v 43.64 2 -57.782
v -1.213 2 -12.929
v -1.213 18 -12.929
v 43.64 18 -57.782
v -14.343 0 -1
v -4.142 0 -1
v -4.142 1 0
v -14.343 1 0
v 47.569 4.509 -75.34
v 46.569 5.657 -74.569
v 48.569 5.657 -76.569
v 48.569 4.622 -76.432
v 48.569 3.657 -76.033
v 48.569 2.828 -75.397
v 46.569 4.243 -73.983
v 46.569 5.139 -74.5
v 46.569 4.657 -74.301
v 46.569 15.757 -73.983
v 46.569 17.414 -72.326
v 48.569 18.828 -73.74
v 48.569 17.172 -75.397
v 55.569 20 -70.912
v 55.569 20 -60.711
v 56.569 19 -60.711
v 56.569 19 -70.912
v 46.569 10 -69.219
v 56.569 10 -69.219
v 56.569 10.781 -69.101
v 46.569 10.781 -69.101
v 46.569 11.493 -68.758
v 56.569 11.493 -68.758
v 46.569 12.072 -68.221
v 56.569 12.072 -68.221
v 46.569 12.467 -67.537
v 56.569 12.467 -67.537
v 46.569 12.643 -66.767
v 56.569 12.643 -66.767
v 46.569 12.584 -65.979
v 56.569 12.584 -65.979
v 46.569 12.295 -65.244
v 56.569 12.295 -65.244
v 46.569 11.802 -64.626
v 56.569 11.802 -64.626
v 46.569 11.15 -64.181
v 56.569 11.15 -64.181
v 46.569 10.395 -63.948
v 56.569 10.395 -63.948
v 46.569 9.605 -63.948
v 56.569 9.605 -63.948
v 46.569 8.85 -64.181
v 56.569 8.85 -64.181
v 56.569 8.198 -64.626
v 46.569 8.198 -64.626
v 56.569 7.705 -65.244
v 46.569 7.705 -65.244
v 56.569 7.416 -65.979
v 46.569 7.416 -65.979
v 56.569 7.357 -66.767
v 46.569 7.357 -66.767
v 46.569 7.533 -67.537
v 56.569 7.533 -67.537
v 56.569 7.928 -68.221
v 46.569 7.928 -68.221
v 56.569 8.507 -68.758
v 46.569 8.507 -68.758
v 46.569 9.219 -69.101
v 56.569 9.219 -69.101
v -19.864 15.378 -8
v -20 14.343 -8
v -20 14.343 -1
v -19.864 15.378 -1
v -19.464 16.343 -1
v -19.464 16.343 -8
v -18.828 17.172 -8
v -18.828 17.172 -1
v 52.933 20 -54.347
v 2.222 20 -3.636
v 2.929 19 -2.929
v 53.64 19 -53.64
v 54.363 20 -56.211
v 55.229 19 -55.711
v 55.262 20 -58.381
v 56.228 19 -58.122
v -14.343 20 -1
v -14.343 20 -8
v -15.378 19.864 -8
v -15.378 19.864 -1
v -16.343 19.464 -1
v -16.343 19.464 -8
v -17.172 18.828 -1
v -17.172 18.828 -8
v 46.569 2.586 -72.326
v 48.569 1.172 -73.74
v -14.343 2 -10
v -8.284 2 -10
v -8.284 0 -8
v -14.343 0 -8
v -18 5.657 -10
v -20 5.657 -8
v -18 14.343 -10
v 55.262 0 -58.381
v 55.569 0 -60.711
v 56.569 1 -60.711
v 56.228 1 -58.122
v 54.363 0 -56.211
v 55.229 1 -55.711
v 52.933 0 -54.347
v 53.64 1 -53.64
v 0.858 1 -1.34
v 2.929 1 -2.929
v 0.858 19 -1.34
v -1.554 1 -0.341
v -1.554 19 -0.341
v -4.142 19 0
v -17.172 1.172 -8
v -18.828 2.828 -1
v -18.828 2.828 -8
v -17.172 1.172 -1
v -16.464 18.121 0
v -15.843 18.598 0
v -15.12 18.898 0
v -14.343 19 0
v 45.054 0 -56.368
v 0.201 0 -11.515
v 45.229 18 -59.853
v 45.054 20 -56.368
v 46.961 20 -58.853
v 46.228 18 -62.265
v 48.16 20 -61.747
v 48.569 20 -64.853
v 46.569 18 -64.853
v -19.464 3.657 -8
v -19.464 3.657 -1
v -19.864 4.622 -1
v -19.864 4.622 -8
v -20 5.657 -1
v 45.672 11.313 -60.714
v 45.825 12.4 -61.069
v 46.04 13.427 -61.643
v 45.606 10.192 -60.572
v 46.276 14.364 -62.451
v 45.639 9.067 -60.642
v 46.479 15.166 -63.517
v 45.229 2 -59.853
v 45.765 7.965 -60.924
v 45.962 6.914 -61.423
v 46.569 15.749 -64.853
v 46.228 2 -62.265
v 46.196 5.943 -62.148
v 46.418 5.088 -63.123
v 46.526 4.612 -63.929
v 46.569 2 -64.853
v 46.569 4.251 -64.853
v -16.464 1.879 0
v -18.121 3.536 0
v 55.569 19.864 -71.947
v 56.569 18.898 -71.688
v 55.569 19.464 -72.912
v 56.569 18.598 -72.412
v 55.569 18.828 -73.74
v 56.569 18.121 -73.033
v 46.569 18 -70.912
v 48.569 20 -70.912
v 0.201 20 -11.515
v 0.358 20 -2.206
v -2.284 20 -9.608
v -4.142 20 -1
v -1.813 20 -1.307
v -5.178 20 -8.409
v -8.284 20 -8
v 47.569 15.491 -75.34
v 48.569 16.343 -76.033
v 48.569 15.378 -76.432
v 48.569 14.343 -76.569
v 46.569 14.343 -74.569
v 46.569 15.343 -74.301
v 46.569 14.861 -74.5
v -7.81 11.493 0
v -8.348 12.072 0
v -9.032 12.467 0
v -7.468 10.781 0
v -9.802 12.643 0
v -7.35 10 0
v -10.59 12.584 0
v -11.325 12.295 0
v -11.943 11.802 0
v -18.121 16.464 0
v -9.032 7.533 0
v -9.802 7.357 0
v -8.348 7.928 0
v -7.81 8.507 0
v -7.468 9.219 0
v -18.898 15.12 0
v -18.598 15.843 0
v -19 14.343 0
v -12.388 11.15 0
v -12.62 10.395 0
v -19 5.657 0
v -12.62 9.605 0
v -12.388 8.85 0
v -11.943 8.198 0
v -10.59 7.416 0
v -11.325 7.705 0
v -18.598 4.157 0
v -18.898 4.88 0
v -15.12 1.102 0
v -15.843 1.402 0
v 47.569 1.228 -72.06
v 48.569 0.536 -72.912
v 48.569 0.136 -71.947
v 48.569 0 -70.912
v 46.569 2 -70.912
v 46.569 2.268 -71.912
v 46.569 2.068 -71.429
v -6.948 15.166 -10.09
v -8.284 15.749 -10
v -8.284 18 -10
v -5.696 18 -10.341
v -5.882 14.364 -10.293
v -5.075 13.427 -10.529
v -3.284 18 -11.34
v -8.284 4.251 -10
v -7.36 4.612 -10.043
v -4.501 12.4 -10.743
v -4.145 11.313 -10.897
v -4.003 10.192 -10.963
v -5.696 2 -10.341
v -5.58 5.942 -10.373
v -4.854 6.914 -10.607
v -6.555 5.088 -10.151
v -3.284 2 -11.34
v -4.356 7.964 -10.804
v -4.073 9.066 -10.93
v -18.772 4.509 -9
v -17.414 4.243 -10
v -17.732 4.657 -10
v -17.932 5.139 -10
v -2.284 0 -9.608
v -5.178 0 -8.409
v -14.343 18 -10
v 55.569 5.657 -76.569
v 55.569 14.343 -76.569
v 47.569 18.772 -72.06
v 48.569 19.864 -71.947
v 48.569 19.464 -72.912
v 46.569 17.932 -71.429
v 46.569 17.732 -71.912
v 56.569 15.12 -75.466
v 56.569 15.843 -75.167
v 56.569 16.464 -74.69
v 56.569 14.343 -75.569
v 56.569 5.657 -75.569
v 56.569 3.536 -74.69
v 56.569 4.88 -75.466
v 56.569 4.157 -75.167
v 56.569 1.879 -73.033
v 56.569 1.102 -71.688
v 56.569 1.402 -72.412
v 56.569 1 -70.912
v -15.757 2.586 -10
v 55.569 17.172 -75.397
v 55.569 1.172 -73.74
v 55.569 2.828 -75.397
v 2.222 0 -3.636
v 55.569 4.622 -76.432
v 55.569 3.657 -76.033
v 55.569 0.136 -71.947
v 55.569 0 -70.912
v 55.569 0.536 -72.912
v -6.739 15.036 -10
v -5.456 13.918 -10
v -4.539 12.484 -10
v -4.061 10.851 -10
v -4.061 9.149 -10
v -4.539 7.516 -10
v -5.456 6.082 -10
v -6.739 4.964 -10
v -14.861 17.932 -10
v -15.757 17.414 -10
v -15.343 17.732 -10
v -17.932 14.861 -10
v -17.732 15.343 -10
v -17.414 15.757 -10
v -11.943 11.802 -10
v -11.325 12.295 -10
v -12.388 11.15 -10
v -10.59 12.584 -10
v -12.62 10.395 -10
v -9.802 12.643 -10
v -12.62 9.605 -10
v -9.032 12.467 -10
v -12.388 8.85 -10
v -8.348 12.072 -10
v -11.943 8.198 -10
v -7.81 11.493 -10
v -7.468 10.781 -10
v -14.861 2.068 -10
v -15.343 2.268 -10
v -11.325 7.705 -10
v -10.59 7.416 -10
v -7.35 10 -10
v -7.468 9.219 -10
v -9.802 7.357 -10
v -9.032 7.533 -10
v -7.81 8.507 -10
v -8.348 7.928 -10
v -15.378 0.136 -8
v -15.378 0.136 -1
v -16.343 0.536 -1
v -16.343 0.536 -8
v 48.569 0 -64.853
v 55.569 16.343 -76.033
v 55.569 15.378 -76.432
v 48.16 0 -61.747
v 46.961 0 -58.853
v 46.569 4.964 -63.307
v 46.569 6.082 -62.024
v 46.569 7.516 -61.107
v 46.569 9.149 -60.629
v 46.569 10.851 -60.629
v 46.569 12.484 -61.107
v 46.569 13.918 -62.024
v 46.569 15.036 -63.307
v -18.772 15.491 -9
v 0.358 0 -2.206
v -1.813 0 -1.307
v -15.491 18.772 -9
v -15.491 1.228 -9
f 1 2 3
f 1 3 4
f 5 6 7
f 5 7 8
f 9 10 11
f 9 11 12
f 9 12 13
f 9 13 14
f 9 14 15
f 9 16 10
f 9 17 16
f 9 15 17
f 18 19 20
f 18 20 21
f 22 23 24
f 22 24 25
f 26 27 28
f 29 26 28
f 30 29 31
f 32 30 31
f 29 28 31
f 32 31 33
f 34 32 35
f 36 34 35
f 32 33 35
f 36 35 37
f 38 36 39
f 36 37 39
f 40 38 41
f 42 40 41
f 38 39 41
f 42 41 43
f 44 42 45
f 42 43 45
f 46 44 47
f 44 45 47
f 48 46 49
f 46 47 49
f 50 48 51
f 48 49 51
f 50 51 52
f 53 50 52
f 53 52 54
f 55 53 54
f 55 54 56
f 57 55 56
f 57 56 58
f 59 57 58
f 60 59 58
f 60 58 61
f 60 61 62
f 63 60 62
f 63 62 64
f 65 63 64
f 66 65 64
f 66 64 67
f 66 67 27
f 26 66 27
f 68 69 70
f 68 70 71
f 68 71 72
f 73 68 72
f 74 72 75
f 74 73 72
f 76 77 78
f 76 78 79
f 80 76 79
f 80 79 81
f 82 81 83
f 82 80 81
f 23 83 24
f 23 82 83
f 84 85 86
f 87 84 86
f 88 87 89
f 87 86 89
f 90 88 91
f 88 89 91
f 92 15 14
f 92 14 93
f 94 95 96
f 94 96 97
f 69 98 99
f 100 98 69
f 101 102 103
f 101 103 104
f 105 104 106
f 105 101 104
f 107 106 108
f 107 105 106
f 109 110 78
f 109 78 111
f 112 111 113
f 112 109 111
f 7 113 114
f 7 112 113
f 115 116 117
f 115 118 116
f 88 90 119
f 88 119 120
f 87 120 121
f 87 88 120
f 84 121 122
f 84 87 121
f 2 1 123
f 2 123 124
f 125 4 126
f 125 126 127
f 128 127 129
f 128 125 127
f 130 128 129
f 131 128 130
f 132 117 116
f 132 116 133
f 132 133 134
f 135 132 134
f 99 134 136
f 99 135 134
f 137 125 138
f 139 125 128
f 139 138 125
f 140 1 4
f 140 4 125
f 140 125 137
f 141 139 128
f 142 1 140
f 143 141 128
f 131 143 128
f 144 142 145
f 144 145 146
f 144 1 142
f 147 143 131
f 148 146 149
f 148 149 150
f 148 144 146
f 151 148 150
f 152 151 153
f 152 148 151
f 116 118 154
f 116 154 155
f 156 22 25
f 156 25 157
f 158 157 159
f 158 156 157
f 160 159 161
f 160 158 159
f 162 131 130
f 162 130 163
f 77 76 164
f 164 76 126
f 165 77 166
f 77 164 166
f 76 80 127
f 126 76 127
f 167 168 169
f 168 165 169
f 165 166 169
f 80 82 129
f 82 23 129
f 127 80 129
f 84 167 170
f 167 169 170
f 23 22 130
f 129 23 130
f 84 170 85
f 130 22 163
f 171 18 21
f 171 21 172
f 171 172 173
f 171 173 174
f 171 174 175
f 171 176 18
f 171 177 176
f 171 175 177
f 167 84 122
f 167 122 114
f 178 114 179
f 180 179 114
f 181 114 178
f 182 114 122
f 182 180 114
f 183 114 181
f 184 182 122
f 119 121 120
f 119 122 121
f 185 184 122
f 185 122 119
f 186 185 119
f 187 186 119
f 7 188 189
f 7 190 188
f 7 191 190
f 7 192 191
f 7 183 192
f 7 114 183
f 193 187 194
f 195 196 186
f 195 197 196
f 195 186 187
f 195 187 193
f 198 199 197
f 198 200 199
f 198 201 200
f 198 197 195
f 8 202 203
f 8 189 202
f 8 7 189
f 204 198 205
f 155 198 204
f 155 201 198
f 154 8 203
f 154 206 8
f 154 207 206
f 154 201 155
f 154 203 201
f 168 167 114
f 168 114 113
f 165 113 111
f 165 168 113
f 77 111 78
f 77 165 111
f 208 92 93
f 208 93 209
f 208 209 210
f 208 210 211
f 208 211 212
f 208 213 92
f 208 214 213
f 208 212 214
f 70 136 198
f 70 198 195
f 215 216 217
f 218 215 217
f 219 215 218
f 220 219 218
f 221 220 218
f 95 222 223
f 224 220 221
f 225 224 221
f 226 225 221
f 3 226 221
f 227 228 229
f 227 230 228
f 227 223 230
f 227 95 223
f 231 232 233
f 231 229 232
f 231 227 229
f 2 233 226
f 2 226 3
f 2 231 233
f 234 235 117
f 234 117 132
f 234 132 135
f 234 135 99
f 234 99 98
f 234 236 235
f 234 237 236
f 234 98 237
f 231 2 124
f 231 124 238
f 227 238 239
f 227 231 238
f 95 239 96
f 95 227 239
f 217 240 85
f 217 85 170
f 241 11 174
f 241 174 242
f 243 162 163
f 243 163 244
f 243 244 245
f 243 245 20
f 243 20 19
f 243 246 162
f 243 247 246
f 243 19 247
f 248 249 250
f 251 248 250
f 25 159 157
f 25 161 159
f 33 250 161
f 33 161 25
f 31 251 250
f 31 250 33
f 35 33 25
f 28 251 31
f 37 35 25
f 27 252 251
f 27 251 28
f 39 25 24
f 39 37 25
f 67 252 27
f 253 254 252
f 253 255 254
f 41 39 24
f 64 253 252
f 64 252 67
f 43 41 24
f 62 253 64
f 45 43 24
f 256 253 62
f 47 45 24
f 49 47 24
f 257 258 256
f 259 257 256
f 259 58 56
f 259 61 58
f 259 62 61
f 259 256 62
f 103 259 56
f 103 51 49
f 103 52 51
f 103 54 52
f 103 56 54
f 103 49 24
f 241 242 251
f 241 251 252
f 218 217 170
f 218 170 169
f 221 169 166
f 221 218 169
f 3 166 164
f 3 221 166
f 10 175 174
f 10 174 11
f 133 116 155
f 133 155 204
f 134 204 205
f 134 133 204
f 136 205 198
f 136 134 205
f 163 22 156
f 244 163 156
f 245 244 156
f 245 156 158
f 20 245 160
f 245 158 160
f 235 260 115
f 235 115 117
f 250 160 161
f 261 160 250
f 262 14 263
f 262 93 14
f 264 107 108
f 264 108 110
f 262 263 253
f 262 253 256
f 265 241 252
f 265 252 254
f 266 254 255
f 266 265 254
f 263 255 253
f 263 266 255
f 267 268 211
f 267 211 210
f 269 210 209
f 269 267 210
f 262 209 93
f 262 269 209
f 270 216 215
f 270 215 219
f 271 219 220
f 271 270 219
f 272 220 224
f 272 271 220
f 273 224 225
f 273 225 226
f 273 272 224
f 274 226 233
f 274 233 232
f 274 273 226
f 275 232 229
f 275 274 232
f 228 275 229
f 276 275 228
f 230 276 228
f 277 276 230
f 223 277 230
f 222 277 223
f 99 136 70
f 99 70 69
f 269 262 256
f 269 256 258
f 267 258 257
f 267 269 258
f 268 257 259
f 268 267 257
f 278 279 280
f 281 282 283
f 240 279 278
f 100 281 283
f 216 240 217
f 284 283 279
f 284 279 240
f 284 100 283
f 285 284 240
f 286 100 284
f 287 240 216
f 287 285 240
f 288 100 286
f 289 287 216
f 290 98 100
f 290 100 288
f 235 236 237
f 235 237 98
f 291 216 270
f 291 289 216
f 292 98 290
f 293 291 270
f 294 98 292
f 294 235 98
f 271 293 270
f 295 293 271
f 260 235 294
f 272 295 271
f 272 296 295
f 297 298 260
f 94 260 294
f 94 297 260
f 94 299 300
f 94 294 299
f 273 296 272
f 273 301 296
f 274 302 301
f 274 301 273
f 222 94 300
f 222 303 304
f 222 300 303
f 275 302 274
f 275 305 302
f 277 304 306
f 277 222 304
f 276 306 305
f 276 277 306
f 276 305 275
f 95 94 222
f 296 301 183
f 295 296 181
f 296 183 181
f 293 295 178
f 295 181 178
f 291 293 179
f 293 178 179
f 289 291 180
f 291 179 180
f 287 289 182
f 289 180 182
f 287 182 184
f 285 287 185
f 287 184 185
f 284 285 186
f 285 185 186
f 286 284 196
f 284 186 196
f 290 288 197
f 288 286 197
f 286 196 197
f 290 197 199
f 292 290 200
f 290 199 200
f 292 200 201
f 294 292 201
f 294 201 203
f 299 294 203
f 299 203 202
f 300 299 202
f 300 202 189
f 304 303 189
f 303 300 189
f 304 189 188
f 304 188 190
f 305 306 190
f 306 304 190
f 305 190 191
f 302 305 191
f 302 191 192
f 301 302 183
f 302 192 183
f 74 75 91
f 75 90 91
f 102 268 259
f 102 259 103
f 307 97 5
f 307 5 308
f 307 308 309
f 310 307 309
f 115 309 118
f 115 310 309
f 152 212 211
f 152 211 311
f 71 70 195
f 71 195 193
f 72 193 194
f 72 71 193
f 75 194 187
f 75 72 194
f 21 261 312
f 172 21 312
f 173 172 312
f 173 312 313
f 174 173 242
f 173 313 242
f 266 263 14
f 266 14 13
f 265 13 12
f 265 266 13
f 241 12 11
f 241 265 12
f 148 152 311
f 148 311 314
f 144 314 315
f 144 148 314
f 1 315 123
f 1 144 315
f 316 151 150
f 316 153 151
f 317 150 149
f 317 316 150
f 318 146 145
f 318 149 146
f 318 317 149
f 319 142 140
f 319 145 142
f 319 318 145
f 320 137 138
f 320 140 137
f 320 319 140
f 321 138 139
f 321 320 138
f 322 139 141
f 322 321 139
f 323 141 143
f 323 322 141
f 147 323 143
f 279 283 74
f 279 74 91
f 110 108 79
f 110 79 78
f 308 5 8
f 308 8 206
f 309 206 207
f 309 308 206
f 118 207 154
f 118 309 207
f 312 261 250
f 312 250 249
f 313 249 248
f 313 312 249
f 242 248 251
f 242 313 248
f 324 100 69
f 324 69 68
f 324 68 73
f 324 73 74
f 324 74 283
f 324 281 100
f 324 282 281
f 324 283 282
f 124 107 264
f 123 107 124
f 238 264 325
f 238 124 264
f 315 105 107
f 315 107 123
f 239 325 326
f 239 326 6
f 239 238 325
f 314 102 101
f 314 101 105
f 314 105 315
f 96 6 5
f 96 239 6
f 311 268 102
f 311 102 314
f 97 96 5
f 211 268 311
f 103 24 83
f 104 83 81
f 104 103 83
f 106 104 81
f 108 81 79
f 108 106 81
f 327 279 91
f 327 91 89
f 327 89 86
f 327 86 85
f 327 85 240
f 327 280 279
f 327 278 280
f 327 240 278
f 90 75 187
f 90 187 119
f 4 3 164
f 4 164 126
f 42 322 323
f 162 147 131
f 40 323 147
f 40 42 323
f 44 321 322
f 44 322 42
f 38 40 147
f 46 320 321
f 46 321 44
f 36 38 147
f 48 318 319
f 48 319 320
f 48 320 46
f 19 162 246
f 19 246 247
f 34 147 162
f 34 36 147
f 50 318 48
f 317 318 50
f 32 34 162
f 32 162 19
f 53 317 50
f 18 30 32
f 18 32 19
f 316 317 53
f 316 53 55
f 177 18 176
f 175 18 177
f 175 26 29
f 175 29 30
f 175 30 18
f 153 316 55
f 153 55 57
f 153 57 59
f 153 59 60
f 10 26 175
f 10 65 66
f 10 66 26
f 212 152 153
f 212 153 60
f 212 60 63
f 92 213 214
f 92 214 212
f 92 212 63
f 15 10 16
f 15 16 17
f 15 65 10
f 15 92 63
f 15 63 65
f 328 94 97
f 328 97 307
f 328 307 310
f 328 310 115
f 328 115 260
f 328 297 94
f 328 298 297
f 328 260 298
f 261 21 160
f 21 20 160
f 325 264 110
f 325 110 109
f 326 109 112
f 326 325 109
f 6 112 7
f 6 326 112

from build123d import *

# Parameters (mm, degrees)
BOSS_EXTRUDE1_DEPTH = 20
SKETCH2_R           = 2.65
CUT_EXTRUDE1_DEPTH  = 20
SKETCH3_R           = 2.65
CUT_EXTRUDE2_DEPTH  = 20
SKETCH7_R           = 6
CUT_EXTRUDE4_DEPTH  = 5
SKETCH8_R           = 6
CUT_EXTRUDE5_DEPTH  = 5
CHAMFER3_SIZE       = 4
FILLET2_R           = 4
CHAMFER4_SIZE       = 2
CHAMFER5_SIZE       = 1


with BuildPart() as part:
    # Sketch1 → Boss-Extrude1 (new body)
    with BuildSketch(Plane(origin=(0, 0, 0), x_dir=(1, 0, 0), z_dir=(0, 1, 0))):
        with BuildLine():
            Line((-4.142135624, 0), (-20, 0))
            Line((-20, 0), (-20, 10))
            Line((-20, 10), (-8.284271247, 10))
            ThreePointArc((-8.284271247, 10), (-4.457436924, 10.761204675), (-1.213203436, 12.928932188))
            Line((-1.213203436, 12.928932188), (43.639610307, 57.781745931))
            ThreePointArc((43.639610307, 57.781745931), (45.80733782, 61.025979419), (46.568542495, 64.852813742))
            Line((46.568542495, 64.852813742), (46.568542495, 76.568542495))
            Line((46.568542495, 76.568542495), (56.568542495, 76.568542495))
            Line((56.568542495, 76.568542495), (56.568542495, 60.710678119))
            ThreePointArc((56.568542495, 60.710678119), (55.80733782, 56.883843795), (53.639610307, 53.639610307))
            Line((53.639610307, 53.639610307), (2.928932188, 2.928932188))
            ThreePointArc((2.928932188, 2.928932188), (-0.3153013, 0.761204675), (-4.142135624, 0))
        make_face()
    extrude(amount=BOSS_EXTRUDE1_DEPTH)

    # Sketch2 → Cut-Extrude1 (cut)
    with BuildSketch(Plane.XY):
        with Locations((-10, 10)):
            Circle(SKETCH2_R)
    extrude(amount=-CUT_EXTRUDE1_DEPTH, mode=Mode.SUBTRACT)

    # Sketch3 → Cut-Extrude2 (cut)
    with BuildSketch(Plane(origin=(56.568542495, 0, 0), x_dir=(0, 0, -1), z_dir=(1, 0, 0))):
        with Locations((66.568542495, 10)):
            Circle(SKETCH3_R)
    extrude(amount=-CUT_EXTRUDE2_DEPTH, mode=Mode.SUBTRACT)

    # Sketch7 → Cut-Extrude4 (cut)
    with BuildSketch(Plane.ZY.offset(-46.568542495)):
        with Locations((-66.568542495, 10)):
            Circle(SKETCH7_R)
    extrude(amount=CUT_EXTRUDE4_DEPTH, mode=Mode.SUBTRACT)

    # Sketch8 → Cut-Extrude5 (cut)
    with BuildSketch(Plane(origin=(0, 0, -10), x_dir=(-1, 0, 0), z_dir=(0, 0, -1))):
        with Locations((10, 10)):
            Circle(SKETCH8_R)
    extrude(amount=CUT_EXTRUDE5_DEPTH, mode=Mode.SUBTRACT)

    # Chamfer3
    chamfer3_edges = [part.edges().sort_by_distance(p)[0] for p in [
        (51.568542495, 0, -76.568542495),
        (-20, 0, -5),
        (51.568542495, 20, -76.568542495),
        (-20, 20, -5),
    ]]
    chamfer(chamfer3_edges, length=CHAMFER3_SIZE)

    # Fillet2
    fillet2_edges = [part.edges().sort_by_distance(p)[0] for p in [
        (-16, 20, -5),
        (51.568542495, 20, -72.568542495),
        (51.568542495, 4, -76.568542495),
        (51.568542495, 16, -76.568542495),
        (-16, 0, -5),
        (51.568542495, 0, -72.568542495),
        (-20, 16, -5),
        (-20, 4, -5),
    ]]
    fillet(fillet2_edges, radius=FILLET2_R)

    # Chamfer4
    chamfer4_edges = [part.edges().sort_by_distance(p)[0] for p in [
        (46.568542495, 20, -67.882250994),
        (46.568542495, 18, -74.568542495),
        (46.568542495, 2, -74.568542495),
        (46.568542495, 0, -67.882250994),
        (46.568542495, 15.87387948, -76.264060625),
        (46.568542495, 19.69551813, -72.442421975),
        (46.568542495, 0.30448187, -72.442421975),
        (46.568542495, 4.12612052, -76.264060625),
        (-18, 18, -10),
        (-11.313708499, 0, -10),
        (-18, 2, -10),
        (-20, 10, -10),
        (-19.69551813, 4.12612052, -10),
        (-15.87387948, 0.30448187, -10),
        (-19.69551813, 15.87387948, -10),
        (-15.87387948, 19.69551813, -10),
        (-4.457436924, 0, -10.761204675),
        (21.213203436, 0, -35.355339059),
        (45.80733782, 0, -61.025979419),
        (45.80733782, 20, -61.025979419),
        (21.213203436, 20, -35.355339059),
        (-4.457436924, 20, -10.761204675),
        (-11.313708499, 20, -10),
        (46.568542495, 10, -76.568542495),
    ]]
    chamfer(chamfer4_edges, length=CHAMFER4_SIZE)

    # Chamfer5
    chamfer5_edges = [part.edges().sort_by_distance(p)[0] for p in [
        (56.568542495, 2, -74.568542495),
        (56.568542495, 18, -74.568542495),
        (56.568542495, 15.87387948, -76.264060625),
        (56.568542495, 19.69551813, -72.442421975),
        (56.568542495, 0.30448187, -72.442421975),
        (56.568542495, 4.12612052, -76.264060625),
        (-9.242640687, 0, 0),
        (-9.242640687, 20, 0),
        (-20, 10, 0),
        (-18, 2, 0),
        (-18, 18, 0),
        (-19.69551813, 4.12612052, 0),
        (-15.87387948, 0.30448187, 0),
        (-19.69551813, 15.87387948, 0),
        (-15.87387948, 19.69551813, 0),
        (-0.3153013, 20, -0.761204675),
        (56.568542495, 0, -65.811183182),
        (55.80733782, 0, -56.883843795),
        (28.284271247, 0, -28.284271247),
        (-0.3153013, 0, -0.761204675),
        (28.284271247, 20, -28.284271247),
        (55.80733782, 20, -56.883843795),
        (56.568542495, 20, -65.811183182),
        (56.568542495, 10, -76.568542495),
    ]]
    chamfer(chamfer5_edges, length=CHAMFER5_SIZE)


solid = part.part
